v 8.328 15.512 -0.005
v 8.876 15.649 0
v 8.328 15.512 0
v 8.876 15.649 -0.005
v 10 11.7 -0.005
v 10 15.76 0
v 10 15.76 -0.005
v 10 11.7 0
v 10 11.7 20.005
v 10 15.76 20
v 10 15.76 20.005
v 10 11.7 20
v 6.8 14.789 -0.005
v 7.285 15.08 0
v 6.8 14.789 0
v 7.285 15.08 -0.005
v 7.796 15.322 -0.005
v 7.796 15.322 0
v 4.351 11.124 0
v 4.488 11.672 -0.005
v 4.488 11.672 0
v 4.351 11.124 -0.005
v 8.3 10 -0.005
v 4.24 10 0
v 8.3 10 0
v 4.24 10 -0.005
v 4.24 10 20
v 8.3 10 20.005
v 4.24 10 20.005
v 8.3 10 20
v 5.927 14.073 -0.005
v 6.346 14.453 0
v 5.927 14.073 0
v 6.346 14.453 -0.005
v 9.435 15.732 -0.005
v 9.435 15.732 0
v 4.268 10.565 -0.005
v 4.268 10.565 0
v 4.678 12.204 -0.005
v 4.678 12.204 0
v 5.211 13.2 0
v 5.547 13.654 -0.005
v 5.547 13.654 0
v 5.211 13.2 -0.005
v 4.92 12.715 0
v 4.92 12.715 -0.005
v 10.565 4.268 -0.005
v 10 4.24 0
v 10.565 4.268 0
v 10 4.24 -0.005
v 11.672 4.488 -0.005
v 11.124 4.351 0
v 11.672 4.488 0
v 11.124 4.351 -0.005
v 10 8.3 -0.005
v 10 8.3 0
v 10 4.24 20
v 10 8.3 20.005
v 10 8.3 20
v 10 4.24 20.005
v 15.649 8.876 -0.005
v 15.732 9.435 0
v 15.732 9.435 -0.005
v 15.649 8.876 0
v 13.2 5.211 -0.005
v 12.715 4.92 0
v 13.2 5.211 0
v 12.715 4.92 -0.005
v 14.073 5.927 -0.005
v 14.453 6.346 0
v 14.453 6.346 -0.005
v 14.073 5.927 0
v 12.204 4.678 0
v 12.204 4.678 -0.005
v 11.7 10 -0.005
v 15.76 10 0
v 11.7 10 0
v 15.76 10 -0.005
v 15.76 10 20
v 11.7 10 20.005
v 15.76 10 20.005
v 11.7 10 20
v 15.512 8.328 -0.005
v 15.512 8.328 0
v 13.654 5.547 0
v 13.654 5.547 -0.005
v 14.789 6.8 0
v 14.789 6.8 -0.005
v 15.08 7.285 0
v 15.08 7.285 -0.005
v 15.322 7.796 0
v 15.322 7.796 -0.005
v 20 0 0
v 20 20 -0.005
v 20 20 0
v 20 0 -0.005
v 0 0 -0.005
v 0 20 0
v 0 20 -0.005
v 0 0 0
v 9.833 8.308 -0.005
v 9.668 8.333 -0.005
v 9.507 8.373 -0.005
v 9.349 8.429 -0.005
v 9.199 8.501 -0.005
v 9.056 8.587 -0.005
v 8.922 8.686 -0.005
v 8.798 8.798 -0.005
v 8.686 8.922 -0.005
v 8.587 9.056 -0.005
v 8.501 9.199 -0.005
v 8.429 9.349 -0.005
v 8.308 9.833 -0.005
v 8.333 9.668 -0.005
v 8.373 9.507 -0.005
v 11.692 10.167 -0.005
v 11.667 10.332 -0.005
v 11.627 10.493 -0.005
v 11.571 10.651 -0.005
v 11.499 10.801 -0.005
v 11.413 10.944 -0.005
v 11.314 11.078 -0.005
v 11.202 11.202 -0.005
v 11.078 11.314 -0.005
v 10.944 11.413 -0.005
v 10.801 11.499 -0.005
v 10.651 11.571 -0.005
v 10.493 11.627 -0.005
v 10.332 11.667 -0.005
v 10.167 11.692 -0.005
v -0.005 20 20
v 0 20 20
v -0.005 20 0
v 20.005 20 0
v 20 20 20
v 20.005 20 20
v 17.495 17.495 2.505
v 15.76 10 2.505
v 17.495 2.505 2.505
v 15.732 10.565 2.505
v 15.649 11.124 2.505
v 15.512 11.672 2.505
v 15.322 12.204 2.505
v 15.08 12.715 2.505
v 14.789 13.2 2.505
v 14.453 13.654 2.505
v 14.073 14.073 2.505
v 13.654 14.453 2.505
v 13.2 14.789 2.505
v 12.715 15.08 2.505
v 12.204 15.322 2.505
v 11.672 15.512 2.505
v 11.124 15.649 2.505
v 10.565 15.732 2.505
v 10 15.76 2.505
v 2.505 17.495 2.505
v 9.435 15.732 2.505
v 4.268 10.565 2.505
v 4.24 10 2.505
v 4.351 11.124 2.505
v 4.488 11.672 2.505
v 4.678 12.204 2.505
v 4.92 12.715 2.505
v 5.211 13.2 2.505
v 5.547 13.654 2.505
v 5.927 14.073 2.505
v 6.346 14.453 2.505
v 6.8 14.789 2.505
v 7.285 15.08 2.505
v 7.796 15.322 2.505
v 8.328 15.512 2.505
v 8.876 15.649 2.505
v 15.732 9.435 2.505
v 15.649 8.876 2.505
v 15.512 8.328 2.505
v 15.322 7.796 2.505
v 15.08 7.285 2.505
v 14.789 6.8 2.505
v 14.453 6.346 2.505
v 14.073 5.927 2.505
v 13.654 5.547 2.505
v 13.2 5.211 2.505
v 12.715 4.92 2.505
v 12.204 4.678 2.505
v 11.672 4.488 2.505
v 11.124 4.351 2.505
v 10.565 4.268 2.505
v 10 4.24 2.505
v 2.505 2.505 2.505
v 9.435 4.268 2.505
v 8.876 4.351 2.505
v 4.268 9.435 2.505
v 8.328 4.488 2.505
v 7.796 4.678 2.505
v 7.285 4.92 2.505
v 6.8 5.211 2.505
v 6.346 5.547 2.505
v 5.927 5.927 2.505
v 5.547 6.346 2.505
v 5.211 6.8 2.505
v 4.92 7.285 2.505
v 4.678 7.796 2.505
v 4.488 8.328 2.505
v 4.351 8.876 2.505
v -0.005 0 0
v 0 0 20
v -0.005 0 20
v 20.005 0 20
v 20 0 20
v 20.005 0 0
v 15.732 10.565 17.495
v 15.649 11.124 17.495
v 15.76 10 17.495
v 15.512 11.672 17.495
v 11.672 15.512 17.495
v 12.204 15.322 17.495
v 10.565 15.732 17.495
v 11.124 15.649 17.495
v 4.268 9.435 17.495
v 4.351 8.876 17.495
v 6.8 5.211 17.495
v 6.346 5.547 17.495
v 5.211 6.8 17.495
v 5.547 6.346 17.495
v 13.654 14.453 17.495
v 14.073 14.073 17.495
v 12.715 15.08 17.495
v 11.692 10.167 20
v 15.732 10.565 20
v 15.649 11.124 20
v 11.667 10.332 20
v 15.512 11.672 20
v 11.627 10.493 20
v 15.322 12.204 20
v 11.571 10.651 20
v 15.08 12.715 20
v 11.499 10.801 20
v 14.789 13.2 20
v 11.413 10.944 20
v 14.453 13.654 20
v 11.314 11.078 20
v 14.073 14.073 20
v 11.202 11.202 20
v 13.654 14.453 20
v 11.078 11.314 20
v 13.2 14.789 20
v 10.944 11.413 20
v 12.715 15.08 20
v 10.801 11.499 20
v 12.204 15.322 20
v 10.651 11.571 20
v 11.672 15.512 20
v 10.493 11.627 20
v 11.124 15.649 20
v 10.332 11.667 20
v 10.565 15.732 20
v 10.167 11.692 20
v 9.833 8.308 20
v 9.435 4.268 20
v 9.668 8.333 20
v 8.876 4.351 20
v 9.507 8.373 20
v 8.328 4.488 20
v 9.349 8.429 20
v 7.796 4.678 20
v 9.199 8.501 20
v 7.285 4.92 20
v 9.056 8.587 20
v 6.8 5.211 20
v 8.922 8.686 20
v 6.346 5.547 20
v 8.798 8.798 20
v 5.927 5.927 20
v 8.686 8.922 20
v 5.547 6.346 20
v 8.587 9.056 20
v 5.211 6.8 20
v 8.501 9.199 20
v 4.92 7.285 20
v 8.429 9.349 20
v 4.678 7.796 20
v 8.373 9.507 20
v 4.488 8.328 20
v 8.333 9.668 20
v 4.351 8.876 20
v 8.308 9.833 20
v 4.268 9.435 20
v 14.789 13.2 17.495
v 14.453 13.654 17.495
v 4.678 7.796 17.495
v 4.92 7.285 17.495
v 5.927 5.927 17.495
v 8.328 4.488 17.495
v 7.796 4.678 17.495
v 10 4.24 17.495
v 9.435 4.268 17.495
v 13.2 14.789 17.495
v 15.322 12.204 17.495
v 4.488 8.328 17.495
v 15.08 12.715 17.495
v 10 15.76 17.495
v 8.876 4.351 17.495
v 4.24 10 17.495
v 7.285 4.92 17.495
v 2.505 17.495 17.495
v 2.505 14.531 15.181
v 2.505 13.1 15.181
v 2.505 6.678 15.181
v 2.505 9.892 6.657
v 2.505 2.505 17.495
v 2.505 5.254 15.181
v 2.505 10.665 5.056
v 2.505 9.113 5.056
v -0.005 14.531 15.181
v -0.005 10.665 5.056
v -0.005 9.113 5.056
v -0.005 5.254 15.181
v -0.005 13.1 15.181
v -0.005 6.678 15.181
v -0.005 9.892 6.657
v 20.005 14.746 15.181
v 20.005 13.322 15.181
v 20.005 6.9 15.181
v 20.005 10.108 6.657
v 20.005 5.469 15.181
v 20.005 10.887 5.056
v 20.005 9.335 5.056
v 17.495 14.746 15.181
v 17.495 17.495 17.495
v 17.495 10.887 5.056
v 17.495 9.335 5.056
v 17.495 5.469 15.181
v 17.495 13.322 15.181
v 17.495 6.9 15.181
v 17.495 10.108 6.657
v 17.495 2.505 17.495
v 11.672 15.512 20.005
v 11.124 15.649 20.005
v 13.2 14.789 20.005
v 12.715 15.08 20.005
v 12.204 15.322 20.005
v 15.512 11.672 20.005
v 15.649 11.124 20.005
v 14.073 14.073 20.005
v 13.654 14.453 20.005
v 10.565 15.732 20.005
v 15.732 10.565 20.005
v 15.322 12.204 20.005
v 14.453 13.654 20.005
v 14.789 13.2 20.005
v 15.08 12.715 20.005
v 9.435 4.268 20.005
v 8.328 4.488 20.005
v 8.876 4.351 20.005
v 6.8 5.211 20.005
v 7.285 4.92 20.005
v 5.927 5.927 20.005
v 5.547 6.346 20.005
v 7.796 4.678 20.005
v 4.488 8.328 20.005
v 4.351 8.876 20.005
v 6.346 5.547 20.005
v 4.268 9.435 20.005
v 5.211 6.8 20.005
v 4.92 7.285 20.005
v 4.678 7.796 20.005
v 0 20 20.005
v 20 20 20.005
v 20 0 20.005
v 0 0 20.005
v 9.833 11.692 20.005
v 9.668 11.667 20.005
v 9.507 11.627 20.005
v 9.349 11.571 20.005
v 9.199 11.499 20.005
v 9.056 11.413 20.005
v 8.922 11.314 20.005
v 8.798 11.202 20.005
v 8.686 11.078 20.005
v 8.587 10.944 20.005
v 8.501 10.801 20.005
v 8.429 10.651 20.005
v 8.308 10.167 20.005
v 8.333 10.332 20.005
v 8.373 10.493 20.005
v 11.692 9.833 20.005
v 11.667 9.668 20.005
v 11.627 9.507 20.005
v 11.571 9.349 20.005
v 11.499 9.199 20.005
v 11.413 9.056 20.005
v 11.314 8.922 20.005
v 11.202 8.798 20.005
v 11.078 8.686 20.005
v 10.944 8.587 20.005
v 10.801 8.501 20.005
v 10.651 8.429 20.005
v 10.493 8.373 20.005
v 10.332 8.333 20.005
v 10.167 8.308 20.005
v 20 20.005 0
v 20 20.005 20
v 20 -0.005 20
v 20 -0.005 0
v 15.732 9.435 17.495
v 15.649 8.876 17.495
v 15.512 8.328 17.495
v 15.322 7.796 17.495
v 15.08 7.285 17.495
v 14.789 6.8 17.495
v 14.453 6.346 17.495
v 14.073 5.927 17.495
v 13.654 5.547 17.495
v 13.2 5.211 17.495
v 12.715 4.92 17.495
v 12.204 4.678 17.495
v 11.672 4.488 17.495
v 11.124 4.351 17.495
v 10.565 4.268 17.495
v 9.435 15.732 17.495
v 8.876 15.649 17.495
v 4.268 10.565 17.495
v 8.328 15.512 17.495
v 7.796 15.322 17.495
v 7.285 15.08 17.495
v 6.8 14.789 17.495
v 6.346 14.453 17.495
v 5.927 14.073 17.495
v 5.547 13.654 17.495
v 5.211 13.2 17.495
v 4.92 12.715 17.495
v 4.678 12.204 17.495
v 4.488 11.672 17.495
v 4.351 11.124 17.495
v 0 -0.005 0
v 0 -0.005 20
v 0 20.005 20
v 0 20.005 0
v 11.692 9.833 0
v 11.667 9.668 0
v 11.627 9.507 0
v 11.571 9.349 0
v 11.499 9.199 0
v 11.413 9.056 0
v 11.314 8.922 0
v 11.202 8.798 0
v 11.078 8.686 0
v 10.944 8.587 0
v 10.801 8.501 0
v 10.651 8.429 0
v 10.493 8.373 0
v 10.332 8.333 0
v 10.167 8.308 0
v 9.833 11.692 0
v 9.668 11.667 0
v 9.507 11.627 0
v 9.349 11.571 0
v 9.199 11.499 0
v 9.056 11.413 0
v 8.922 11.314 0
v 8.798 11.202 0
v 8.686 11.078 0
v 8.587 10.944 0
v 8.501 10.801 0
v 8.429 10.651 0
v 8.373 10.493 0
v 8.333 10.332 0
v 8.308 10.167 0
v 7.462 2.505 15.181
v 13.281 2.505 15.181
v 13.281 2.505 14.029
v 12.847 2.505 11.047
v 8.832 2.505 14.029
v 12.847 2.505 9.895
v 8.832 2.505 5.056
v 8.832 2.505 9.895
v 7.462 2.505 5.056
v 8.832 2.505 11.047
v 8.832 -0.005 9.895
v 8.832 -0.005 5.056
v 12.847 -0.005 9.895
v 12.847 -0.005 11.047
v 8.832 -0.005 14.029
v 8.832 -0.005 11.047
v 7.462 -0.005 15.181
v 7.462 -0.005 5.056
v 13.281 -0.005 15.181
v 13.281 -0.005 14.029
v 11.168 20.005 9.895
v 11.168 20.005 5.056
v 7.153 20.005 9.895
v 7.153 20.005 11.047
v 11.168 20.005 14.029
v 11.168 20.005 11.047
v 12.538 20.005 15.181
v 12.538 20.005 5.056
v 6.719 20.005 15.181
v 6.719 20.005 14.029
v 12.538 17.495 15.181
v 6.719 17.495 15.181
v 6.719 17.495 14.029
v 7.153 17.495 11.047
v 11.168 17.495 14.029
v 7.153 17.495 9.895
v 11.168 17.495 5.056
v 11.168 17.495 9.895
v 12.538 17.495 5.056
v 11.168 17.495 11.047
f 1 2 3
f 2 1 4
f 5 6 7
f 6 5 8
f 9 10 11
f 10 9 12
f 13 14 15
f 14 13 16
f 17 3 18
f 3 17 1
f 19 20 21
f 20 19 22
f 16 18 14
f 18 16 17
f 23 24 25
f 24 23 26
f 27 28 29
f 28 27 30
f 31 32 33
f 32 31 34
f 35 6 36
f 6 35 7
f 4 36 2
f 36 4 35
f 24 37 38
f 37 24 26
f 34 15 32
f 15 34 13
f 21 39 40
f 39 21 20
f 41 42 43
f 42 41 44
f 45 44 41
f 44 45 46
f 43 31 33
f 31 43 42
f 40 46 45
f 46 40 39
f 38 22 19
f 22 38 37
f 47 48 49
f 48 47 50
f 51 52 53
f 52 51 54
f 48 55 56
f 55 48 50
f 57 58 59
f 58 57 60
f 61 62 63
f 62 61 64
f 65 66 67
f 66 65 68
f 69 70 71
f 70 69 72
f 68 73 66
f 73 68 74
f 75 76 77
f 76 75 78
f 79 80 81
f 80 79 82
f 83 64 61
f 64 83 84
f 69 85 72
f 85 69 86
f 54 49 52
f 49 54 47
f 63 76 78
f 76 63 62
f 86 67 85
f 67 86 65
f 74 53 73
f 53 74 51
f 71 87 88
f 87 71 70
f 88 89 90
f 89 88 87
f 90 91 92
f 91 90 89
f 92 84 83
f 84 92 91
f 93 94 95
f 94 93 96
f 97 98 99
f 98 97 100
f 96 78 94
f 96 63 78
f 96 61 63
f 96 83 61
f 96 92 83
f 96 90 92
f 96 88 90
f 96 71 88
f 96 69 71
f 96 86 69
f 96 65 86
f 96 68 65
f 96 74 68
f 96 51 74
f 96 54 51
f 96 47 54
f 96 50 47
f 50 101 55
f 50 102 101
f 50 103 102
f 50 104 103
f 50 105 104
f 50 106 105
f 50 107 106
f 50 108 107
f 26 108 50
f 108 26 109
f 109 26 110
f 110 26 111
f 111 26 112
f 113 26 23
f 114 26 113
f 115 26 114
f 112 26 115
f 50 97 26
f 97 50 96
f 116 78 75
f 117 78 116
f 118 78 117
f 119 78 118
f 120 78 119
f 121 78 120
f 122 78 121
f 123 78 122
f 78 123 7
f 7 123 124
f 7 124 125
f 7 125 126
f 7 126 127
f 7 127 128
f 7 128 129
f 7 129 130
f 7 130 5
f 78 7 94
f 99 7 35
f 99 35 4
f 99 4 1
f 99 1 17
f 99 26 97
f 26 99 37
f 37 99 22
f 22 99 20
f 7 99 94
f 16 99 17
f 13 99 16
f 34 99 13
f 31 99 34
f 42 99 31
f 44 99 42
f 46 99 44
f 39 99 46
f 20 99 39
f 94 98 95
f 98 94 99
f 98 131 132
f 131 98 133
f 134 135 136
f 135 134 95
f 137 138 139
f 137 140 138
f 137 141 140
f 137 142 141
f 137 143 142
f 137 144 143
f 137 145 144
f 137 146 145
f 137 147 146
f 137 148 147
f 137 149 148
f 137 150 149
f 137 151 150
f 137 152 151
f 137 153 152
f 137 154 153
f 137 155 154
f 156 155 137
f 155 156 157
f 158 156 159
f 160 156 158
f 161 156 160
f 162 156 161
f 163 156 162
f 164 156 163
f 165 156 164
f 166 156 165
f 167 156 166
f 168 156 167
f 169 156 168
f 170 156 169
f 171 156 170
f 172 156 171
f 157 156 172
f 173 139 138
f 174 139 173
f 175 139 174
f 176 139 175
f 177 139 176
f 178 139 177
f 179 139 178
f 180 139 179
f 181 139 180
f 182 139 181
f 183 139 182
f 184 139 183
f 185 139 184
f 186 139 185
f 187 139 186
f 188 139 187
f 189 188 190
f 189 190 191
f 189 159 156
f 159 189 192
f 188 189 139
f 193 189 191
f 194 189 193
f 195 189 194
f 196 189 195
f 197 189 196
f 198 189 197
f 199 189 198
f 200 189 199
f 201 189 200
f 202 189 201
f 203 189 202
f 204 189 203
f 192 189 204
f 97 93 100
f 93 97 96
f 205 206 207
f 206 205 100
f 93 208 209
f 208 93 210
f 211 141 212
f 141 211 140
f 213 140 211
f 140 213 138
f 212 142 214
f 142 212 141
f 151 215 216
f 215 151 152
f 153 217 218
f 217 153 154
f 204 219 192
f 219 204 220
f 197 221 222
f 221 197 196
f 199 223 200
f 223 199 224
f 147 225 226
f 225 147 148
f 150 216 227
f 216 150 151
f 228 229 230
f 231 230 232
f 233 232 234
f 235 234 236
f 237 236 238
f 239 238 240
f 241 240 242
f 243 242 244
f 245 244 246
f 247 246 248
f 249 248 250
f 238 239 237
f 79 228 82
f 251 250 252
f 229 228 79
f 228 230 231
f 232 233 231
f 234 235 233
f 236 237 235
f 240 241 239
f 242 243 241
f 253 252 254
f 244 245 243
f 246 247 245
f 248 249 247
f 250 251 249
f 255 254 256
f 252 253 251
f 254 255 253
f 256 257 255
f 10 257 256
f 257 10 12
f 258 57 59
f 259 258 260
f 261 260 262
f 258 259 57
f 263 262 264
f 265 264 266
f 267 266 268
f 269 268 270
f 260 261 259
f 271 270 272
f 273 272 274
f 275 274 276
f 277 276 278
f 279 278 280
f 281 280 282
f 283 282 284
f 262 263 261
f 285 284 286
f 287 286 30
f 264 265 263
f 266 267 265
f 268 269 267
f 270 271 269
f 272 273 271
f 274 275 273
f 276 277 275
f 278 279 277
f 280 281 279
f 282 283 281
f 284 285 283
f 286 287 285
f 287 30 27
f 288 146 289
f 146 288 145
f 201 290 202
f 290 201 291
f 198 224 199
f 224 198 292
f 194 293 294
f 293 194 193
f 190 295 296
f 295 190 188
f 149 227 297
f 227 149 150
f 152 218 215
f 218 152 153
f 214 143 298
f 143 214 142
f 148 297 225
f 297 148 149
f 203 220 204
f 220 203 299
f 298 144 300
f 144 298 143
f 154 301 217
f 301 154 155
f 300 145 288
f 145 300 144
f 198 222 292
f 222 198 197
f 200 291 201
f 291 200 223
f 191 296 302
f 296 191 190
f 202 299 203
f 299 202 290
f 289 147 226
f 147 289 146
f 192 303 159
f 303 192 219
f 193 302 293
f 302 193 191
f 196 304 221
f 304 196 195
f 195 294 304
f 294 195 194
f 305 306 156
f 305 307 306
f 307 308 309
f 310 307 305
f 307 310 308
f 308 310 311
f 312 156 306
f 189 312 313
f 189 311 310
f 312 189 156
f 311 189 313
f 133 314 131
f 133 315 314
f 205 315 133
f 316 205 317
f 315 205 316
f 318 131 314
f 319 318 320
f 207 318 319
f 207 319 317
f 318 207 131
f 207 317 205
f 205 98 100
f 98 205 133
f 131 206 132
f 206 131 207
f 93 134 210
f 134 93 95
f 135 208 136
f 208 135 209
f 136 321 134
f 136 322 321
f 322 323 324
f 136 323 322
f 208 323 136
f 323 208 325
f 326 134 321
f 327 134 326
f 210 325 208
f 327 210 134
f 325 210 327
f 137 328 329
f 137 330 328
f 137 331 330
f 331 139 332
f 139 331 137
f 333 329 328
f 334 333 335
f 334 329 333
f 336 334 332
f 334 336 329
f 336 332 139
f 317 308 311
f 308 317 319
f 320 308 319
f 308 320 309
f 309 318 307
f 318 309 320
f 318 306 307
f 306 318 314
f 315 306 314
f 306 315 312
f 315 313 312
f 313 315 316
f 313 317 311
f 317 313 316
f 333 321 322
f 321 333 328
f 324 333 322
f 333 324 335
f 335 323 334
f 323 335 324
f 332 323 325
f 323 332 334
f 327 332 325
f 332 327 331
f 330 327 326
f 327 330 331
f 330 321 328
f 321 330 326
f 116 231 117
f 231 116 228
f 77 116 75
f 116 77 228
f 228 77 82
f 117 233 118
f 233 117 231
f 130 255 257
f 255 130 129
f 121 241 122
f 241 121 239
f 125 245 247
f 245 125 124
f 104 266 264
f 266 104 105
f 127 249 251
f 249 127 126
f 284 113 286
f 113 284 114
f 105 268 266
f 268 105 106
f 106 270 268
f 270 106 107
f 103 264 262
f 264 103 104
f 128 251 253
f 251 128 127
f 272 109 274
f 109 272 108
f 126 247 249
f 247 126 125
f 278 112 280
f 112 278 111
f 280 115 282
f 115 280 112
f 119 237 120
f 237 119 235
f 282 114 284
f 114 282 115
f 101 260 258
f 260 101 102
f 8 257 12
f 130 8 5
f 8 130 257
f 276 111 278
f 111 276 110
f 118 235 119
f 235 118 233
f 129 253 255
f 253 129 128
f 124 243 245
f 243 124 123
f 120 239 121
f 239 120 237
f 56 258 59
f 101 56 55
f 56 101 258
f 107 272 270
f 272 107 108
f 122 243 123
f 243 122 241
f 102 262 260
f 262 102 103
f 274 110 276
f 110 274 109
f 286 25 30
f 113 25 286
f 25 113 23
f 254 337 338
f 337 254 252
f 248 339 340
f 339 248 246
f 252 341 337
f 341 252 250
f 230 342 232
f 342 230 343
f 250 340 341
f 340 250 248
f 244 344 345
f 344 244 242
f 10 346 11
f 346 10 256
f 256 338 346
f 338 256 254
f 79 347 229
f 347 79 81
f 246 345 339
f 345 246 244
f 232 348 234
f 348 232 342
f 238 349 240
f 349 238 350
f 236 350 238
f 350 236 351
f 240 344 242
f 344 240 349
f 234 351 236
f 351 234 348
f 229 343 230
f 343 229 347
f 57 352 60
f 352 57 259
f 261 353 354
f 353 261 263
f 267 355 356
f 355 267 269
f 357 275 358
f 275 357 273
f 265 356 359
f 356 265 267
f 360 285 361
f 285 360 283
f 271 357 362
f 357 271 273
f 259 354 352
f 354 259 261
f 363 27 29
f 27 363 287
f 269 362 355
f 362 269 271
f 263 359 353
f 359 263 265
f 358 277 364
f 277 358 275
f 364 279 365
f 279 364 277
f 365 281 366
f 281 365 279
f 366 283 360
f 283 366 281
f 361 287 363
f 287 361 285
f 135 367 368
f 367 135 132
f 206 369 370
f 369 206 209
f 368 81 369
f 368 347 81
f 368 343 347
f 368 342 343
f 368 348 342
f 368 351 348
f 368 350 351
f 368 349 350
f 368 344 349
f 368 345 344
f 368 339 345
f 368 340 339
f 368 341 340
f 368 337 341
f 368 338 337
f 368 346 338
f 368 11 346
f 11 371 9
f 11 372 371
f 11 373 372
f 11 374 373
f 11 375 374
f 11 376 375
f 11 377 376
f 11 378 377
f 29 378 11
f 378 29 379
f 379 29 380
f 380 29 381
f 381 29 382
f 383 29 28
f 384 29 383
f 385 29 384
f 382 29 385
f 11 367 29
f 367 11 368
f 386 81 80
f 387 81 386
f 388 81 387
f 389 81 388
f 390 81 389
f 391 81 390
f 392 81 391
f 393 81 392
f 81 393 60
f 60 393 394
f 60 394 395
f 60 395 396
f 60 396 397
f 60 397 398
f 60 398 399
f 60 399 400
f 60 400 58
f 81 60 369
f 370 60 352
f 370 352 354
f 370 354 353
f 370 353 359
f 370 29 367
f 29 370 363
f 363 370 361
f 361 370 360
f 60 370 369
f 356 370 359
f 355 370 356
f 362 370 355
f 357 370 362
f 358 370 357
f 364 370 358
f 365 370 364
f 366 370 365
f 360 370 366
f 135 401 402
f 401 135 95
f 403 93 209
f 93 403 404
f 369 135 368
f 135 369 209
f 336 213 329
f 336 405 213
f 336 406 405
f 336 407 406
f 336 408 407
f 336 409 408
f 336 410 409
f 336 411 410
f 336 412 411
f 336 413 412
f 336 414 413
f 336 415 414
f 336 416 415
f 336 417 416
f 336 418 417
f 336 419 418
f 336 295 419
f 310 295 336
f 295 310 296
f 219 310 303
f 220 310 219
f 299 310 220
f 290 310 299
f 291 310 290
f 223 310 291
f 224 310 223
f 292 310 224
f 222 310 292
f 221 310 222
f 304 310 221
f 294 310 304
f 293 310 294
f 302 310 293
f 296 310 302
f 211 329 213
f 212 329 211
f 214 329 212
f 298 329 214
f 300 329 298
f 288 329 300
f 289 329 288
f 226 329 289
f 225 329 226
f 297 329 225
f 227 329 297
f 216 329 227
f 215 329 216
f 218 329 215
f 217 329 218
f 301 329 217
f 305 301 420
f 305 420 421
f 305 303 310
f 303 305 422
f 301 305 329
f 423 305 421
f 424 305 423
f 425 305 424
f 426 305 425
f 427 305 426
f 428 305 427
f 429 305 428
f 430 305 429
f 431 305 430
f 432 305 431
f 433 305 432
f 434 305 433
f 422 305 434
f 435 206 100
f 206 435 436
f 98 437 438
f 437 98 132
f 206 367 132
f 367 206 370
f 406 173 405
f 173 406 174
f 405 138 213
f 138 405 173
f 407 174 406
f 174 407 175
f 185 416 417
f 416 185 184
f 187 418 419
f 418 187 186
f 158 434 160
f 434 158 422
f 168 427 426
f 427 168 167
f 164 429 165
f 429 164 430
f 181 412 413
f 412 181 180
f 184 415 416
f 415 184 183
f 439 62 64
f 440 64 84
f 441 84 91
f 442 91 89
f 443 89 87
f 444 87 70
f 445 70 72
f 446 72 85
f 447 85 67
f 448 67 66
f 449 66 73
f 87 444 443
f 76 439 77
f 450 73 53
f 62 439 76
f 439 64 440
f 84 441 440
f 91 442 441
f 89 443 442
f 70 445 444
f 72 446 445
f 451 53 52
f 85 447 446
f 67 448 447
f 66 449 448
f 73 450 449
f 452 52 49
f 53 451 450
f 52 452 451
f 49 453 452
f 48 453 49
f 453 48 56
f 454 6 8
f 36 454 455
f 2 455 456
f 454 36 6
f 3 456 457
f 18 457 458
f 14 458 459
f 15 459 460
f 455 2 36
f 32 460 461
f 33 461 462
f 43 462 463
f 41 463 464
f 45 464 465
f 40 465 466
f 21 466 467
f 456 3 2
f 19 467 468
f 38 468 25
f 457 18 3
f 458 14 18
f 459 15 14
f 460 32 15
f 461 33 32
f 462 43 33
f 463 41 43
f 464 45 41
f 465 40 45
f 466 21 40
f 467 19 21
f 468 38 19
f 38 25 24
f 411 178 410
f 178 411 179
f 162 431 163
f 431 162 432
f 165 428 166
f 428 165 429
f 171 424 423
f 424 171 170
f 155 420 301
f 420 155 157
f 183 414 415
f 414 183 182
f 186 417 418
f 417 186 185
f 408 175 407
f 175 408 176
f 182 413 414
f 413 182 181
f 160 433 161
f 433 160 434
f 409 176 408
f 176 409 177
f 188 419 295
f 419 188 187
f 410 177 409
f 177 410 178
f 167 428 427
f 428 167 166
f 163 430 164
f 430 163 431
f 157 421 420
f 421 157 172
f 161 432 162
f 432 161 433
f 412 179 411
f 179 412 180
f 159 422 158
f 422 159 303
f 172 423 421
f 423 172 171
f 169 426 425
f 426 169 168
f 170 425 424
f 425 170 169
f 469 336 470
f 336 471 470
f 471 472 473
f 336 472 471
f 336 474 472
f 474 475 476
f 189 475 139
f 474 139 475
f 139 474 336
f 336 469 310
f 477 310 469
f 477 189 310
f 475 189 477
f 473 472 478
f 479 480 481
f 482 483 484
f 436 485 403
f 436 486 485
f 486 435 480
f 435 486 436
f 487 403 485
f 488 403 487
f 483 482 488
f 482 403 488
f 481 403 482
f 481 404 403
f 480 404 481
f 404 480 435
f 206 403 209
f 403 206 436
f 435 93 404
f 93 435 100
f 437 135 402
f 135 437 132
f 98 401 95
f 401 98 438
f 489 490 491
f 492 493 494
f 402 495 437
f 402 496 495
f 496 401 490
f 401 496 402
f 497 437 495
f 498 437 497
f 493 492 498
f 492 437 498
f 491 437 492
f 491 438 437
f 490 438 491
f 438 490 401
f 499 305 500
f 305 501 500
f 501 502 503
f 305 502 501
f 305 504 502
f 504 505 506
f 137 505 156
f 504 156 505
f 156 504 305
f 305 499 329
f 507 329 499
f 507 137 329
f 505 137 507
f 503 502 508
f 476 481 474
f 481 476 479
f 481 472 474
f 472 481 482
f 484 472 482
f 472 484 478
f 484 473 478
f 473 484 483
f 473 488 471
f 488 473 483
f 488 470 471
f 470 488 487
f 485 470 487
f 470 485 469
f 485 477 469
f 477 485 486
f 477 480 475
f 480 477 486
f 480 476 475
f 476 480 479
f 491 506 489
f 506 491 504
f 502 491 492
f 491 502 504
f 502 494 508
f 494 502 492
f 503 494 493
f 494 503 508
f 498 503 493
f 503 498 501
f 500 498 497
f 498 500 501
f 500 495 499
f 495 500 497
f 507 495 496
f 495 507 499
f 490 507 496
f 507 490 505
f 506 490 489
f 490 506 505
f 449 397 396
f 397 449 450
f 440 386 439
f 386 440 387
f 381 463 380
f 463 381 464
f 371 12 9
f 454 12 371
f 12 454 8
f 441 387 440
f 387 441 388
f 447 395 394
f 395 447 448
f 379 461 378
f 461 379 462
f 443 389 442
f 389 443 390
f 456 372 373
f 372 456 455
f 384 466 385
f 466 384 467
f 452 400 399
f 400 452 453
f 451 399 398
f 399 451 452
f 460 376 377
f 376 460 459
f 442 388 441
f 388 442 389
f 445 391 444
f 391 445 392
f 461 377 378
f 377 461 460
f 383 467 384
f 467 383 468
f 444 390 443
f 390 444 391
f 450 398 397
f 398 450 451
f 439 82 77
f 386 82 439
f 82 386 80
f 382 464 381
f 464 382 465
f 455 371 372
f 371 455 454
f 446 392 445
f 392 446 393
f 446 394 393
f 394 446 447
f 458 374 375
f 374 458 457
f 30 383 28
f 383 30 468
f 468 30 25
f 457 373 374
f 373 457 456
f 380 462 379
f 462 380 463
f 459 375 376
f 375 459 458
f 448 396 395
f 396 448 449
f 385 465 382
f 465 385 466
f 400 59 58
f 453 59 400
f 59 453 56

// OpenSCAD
// file: half_cube.scad
// half_cube.scad - Parametric Half-Cube with Snap-Fit Mechanism
// Research-faithful implementation: Dual-U topology, snap locks, mitered walls
// Units: mm

$fn = 64;

// --- Parameters ---
size = 20.0;          // Outer cube dimension
thick = 2.5;          // Wall thickness
rod_D = 3.0;          // Rod diameter
clearance = 0.2;      // Clearance for rod bore
fit_clear = 0;        // Miter face clearance (zeroed; kept for future use)

// --- Visibility Toggles ---
show_base = true;
show_walls = true;
show_mech = true;
show_letter = true;

// --- Advanced Visibility (sub-component toggles) ---
show_wall_left = true;
show_wall_right = true;
show_mech_base_ring = true;
show_mech_pillars = true;
show_mech_snap_beams = true;

// --- Flip Mode (for top unit) ---
is_flipped = false;        // true = top unit (rotated mechanism, inverted letter)

// --- Letter Parameters ---
letter_bottom = "V";
letter_top = "F";
letter = is_flipped ? letter_top : letter_bottom;
letter_emboss = false;     // true = raised, false = carved
letter_depth = 0.5;
letter_size = 10;

// --- Snap-Fit Parameters (scaled from research: 60mm -> size) ---
scale_factor = size / 60;
snap_beam_len   = max(6.0 * scale_factor, 1.5);  // Cantilever beam length
snap_beam_width = max(3.0 * scale_factor, 0.8);   // Beam width
snap_beam_thick = max(1.2 * scale_factor, 0.4);   // Beam thickness
snap_undercut   = max(0.6 * scale_factor, 0.15);   // Undercut depth on snap head
snap_head_len   = max(1.5 * scale_factor, 0.4);    // Length of snap head
snap_relief_w   = max(1.5 * scale_factor, 0.3);    // Relief slot width
snap_relief_d   = max(0.8 * scale_factor, 0.2);    // Relief slot depth into head
snap_sink       = max(size * 0.03, 0.3);               // Head sunk into shaft for boolean union (increased for robust CGAL merge)

// Derived
cyl_R_base = rod_D/2 + clearance;
cyl_R = cyl_R_base + (size/2 - thick - cyl_R_base) * 0.7;  // Adaptive to available space
cyl_H = size - thick - fit_clear;

// Weld cube size for mesh integrity at internal junctions
weld = max(size * 0.02, 0.15);

// --- Main Assembly ---
module assembly(
    flipped=is_flipped,
    v_base=show_base, v_walls=show_walls, v_mech=show_mech, v_letter=show_letter,
    v_wall_left=show_wall_left, v_wall_right=show_wall_right,
    v_mech_base_ring=show_mech_base_ring,
    v_mech_pillars=show_mech_pillars,
    v_mech_snap_beams=show_mech_snap_beams
) {
    difference() {
        union() {
            // 1. Base Plate
            if (v_base)
                translate([size/2, size/2, thick/2])
                    base_plate(flipped=flipped);

            // 2. Side Walls with full mitered edges (top + front/back)
            if (v_walls && v_wall_left)
                translate([thick/2, size/2, size/2])
                    mitered_wall();
            if (v_walls && v_wall_right)
                translate([size - thick/2, size/2, size/2])
                    mirror([1,0,0]) mitered_wall();

            // 3. Central mechanism with snap-fit
            if (v_mech)
                translate([size/2, size/2, 0])
                    mechanism_pillars(flipped=flipped,
                        v_base_ring=v_mech_base_ring,
                        v_pillars=v_mech_pillars,
                        v_snap_beams=v_mech_snap_beams);

            // 4. Letters on BOTH walls (embossed mode)
            if (v_letter && letter_emboss) {
                letter_geometry(flipped=flipped, side="left");
                letter_geometry(flipped=flipped, side="right");
            }
        }

        // Global subtractions
        // Rod bore through center
        translate([size/2, size/2, size/2])
            cylinder(r=rod_D/2 + clearance, h=size*2, center=true);

        // Letters carved on BOTH walls
        if (v_letter && !letter_emboss) {
            letter_geometry(flipped=flipped, side="left");
            letter_geometry(flipped=flipped, side="right");
        }
    }
}

// --- Base Plate ---
// Frustum floor: wider on outer (bottom) face, tapered on inner (top) face
// Quarter-circle perforations for opposing mechanism pass-through
module base_plate(flipped=false) {
    // Bottom half (flipped=false): opposing pillars are at Q2/Q4 (angles 90, 270)
    // Top half (flipped=true): opposing pillars are at Q1/Q3 (angles 0, 180)
    perf_base = flipped ? 0 : 90;
    taper = thick;  // 45° slope: taper equals thickness (rise = run)
    side = size - 2*fit_clear;

    difference() {
        // Frustum: hull between larger outer (bottom) face and smaller inner (top) face
        hull() {
            // Outer face (bottom, z = -thick/2)
            translate([0, 0, -thick/2])
                cube([side, side, 0.01], center=true);
            // Inner face (top, z = +thick/2), inset by taper on XY edges
            translate([0, 0, thick/2])
                cube([side - 2*taper, side - 2*taper, 0.01], center=true);
        }

        // Pillar-shaped perforations for opposing mechanism (pie-slice matching cyl_R)
        for (angle = [perf_base, perf_base + 180])
            rotate([0, 0, angle])
                linear_extrude(thick * 2 + 1, center=true)
                    intersection() {
                        circle(r=cyl_R);
                        polygon([[0,0], [size,0], [0,size]]);
                    }
    }
}

// --- Mitered Wall ---
// Full-height wall as truncated pyramid (frustum): wider outer face, tapered inner face
// Improves interlocking between mating half-cubes
module mitered_wall() {
    wall_length = size - 2*fit_clear;  // Y dimension
    taper = thick;                      // 45° slope: taper equals thickness (rise = run)

    difference() {
        // Frustum: hull between larger outer face and smaller inner face
        hull() {
            // Outer face (at x = -thick/2)
            translate([-thick/2, 0, 0])
                cube([0.01, wall_length, size - fit_clear], center=true);
            // Inner face (at x = +thick/2), smaller by taper on each edge
            translate([thick/2, 0, -taper/2])
                cube([0.01, wall_length - 2*taper, size - fit_clear - taper], center=true);
        }

    }
}

// --- Letter Geometry ---
// Places letter on specified wall exterior
// Both left and right walls get letters
module letter_geometry(flipped=is_flipped, side="left") {
    local_letter = flipped ? letter_top : letter_bottom;
    flip_angle = flipped ? 180 : 0;
    letter_z = size/2;  // Center of cube (full-height walls)

    // Extrusion must penetrate the full frustum wall plus margin
    letter_extrude = letter_depth + (letter_emboss ? 0 : thick + 1);

    if (side == "left") {
        wall_x = -0.5;  // Start outside the wall to ensure full cut-through
        translate([wall_x, size/2, letter_z])
            rotate([90, flip_angle, 90])
                scale([-1, 1, 1])
                    linear_extrude(letter_extrude)
                        text(local_letter, size=letter_size, halign="center", valign="center",
                             font="Allerta Stencil:style=Regular");
    } else {
        // Right wall: mirror placement
        wall_x = size + 0.5;  // Start outside the wall to ensure full cut-through
        translate([wall_x, size/2, letter_z])
            rotate([90, flip_angle, -90])
                scale([-1, 1, 1])
                    linear_extrude(letter_extrude)
                        text(local_letter, size=letter_size, halign="center", valign="center",
                             font="Allerta Stencil:style=Regular");
    }
}

// --- Mechanism Pillars with Snap-Fit ---
// Two opposing quadrant pillars with base ring, snap beams, and weld cubes
module mechanism_pillars(flipped=is_flipped,
    v_base_ring=true, v_pillars=true, v_snap_beams=true
) {
    base_ring_h = thick + max(size * 0.005, 0.05);
    pillar_height = size;

    mech_rotation = flipped ? 90 : 0;

    rotate([0, 0, mech_rotation])
    union() {
        // 1. Pillars with wedge cuts (no base ring)
        if (v_pillars)
            translate([0, 0, 0])
                difference() {
                    cylinder(r=cyl_R, h=pillar_height);

                    // Cut away Q2 and Q4 (90° and 270°)
                    rotate([0, 0, 90])
                        wedge_cutter(pillar_height + 1);
                    rotate([0, 0, 270])
                        wedge_cutter(pillar_height + 1);
                }

        // 4. Snap-fit cantilever beams on pillar faces
        //    Angles inset 10° from quadrant boundaries to ensure beam roots
        //    are fully within pillar material (Q1: 0°–90°, Q3: 180°–270°)
        if (v_snap_beams) {
            // Q1 pillar: beam on +Y face (near 90° boundary)
            translate([0, 0, 0])
                snap_beam_at(angle=80, pillar_height=pillar_height);

            // Q1 pillar: beam on +X face (near 0° boundary)
            translate([0, 0, 0])
                snap_beam_at(angle=10, pillar_height=pillar_height);

            // Q3 pillar: beam on -X face (near 180° boundary)
            translate([0, 0, 0])
                snap_beam_at(angle=190, pillar_height=pillar_height);

            // Q3 pillar: beam on -Y face (near 270° boundary)
            translate([0, 0, 0])
                snap_beam_at(angle=260, pillar_height=pillar_height);
        }

        // 5. Weld cubes at pillar tops for mesh integrity
        //    Placed at pillar centers (Q1=45°, Q3=225°) to avoid cut boundaries
        if (v_snap_beams)
            for (angle = [45, 225])
                rotate([0, 0, angle])
                    translate([cyl_R * 0.4, 0, pillar_height - weld/2])
                        cube(weld, center=true);
    }
}

// --- Snap Beam ---
// Cantilever beam with undercut head and relief slot
// Placed at a given angle on the cylinder surface, growing upward from mid-pillar
module snap_beam_at(angle, pillar_height) {
    beam_z_start = pillar_height * 0.3;  // Start beam at 30% up the pillar

    rotate([0, 0, angle])
    translate([cyl_R - snap_sink, 0, beam_z_start]) {
        // Cantilever beam body
        // Extends radially outward, with length along Z
        rotate([0, 0, 0])
        union() {
            // Beam shaft - tapered slightly (thicker at root)
            hull() {
                // Root (attached to pillar)
                translate([0, -snap_beam_width/2, 0])
                    cube([snap_beam_thick, snap_beam_width, 0.01]);
                // Tip (slightly thinner)
                translate([0, -snap_beam_width/2, snap_beam_len])
                    cube([snap_beam_thick * 0.85, snap_beam_width, 0.01]);
            }

            // Snap head with undercut
            translate([0, -snap_beam_width/2, snap_beam_len])
                snap_head();
        }
    }
}

// --- Snap Head ---
// Overhanging head with undercut for positive engagement
// Includes relief slot for beam flexibility
module snap_head() {
    difference() {
        // Ramped head: hull from full undercut at base to flush at tip
        // Creates ~30° lead-in chamfer for easier insertion
        hull() {
            // Base: full undercut width
            translate([-snap_undercut, 0, 0])
                cube([snap_beam_thick + snap_undercut, snap_beam_width, 0.01]);
            // Tip: no undercut (flush with beam)
            translate([0, 0, snap_head_len - 0.01])
                cube([snap_beam_thick, snap_beam_width, 0.01]);
        }

        // Relief slot through center of head for flexibility
        translate([snap_beam_thick/2 - snap_relief_d/2, (snap_beam_width - snap_relief_w)/2, -0.1])
            cube([snap_relief_d, snap_relief_w, snap_head_len + 0.2]);
    }
}

// --- Wedge Cutter ---
// 90° sector cutter for quadrant removal
module wedge_cutter(h=size) {
    linear_extrude(h)
        polygon([[0, 0], [size, 0], [0, size]]);
}

// --- Render ---
if (is_undef(is_library)) {
    assembly();
}
// main file
// Suppress default render in half_cube
is_library = 1;
include <half_cube.scad>

// --- Parameters ---
// Inherits size, thick, rod_D from half_cube via command line

render_mode = 0; // Part selector (see project.json manifest): 0=all, 1=bottom, 2=top

// --- Letter Parameters ---
letter_bottom = "V";
letter_top = "F";

// --- Visibility Toggles ---
show_bottom = true;  // Show/hide bottom half-cube unit
show_top = true;     // Show/hide top half-cube unit

// --- Per-Half Advanced Visibility ---
show_bottom_base = true;
show_bottom_walls = true;
show_bottom_mech = true;
show_bottom_letter = true;
show_bottom_wall_left = true;
show_bottom_wall_right = true;
show_bottom_mech_base_ring = true;
show_bottom_mech_pillars = true;
show_bottom_mech_snap_beams = true;

show_top_base = true;
show_top_walls = true;
show_top_mech = true;
show_top_letter = true;
show_top_wall_left = true;
show_top_wall_right = true;
show_top_mech_base_ring = true;
show_top_mech_pillars = true;
show_top_mech_snap_beams = true;

// --- Main Assembly ---
// A single interlocking cube (two half-cubes)

// Part A: Right-side up (Bottom Unit)
if (render_mode == 0 || render_mode == 1)
    if (show_bottom) assembly(
        v_base=show_bottom_base, v_walls=show_bottom_walls,
        v_mech=show_bottom_mech, v_letter=show_bottom_letter,
        v_wall_left=show_bottom_wall_left, v_wall_right=show_bottom_wall_right,
        v_mech_base_ring=show_bottom_mech_base_ring,
        v_mech_pillars=show_bottom_mech_pillars,
        v_mech_snap_beams=show_bottom_mech_snap_beams
    );

// Part B: Upside down and Rotated 90 (Top Unit)
if (render_mode == 0 || render_mode == 2)
    if (show_top) translate([0, 0, size]) rotate([180, 0, 90]) assembly(flipped=true,
        v_base=show_top_base, v_walls=show_top_walls,
        v_mech=show_top_mech, v_letter=show_top_letter,
        v_wall_left=show_top_wall_left, v_wall_right=show_top_wall_right,
        v_mech_base_ring=show_top_mech_base_ring,
        v_mech_pillars=show_top_mech_pillars,
        v_mech_snap_beams=show_top_mech_snap_beams
    );
